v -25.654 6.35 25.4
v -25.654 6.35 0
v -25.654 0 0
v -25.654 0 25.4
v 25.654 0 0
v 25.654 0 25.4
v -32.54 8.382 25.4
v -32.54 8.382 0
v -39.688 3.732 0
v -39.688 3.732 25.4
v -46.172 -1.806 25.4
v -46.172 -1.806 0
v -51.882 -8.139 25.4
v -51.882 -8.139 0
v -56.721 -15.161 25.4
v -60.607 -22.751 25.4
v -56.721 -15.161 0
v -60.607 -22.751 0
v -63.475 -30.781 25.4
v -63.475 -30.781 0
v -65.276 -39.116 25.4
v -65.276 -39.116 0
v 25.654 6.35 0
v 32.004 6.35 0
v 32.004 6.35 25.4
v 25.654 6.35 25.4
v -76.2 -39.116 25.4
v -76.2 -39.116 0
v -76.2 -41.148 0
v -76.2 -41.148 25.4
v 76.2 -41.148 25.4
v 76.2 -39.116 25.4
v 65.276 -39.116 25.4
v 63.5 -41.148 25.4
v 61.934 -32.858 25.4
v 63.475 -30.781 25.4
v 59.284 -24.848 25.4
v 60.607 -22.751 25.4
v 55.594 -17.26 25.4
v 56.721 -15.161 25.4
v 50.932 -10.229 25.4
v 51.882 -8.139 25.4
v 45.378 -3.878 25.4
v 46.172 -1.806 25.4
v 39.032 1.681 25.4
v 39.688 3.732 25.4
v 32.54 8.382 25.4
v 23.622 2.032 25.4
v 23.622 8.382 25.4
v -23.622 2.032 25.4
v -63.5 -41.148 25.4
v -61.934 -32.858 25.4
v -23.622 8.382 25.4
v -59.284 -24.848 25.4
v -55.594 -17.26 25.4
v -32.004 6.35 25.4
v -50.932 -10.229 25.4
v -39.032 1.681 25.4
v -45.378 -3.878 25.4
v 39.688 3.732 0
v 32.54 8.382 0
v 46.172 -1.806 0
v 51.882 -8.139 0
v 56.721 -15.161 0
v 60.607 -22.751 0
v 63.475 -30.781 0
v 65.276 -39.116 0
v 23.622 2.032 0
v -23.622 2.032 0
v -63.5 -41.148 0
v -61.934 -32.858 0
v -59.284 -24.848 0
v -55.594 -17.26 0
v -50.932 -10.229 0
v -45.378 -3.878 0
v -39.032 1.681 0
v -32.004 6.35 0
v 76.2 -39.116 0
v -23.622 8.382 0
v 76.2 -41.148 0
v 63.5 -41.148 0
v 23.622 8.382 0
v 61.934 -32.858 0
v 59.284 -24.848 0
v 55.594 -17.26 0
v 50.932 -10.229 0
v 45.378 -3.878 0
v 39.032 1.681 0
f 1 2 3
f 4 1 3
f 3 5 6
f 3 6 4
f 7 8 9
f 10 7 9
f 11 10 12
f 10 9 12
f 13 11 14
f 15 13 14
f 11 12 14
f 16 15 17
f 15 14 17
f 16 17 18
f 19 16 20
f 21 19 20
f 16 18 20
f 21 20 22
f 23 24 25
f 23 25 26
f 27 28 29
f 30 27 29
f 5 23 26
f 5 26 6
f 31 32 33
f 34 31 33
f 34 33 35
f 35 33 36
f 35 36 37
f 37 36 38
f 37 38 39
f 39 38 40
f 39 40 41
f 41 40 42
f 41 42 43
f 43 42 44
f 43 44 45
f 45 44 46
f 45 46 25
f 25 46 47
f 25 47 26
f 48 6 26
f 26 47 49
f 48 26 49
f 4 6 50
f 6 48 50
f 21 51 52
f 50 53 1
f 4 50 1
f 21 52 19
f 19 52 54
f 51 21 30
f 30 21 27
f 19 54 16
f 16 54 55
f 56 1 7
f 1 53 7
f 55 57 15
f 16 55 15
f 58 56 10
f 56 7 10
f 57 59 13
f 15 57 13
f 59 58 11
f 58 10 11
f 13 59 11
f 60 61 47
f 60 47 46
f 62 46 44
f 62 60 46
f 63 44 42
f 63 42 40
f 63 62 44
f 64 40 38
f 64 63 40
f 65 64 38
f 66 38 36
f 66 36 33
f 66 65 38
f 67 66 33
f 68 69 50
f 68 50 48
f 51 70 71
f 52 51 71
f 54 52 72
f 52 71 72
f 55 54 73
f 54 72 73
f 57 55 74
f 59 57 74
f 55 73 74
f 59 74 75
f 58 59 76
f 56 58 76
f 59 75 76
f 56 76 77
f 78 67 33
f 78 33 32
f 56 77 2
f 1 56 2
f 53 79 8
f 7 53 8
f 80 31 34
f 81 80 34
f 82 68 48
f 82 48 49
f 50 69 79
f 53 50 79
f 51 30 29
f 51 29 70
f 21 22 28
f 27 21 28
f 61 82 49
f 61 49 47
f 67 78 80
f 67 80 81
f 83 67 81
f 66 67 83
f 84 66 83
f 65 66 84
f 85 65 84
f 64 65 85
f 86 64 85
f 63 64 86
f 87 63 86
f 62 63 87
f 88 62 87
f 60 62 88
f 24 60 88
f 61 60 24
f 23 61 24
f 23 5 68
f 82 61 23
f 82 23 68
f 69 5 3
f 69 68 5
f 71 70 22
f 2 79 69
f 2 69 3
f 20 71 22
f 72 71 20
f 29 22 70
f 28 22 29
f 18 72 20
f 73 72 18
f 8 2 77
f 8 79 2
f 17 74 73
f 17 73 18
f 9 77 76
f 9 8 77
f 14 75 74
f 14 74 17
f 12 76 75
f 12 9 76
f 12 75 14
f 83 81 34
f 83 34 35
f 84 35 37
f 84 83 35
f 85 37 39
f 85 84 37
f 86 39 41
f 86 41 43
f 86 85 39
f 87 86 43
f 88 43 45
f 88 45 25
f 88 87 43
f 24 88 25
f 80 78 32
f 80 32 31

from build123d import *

# Parameters (mm, degrees)
F1_DEPTH = 25.4


# Not quite as in the source:
# - a pattern or mirror of a feature is missing from the dataset's text; its kind, count and spacing are read off the source's solid


with BuildPart() as f1:
    # F0 (on Top) → F1 (new body)
    with BuildSketch(Plane.XY):
        with BuildLine():
            Line((-25.654, 0), (0, 0))
            Line((0, 0), (0, 2.032))
            Line((0, 2.032), (-23.622, 2.032))
            Line((-23.622, 2.032), (-23.622, 8.382))
            Line((-23.622, 8.382), (-32.5398903871, 8.382))
            ThreePointArc((-32.5398903871, 8.382), (-54.4156625214, -11.5711123989), (-65.2763838561, -39.116))
            Line((-65.2763838561, -39.116), (-76.2, -39.116))
            Line((-76.2, -39.116), (-76.2, -41.148))
            Line((-76.2, -41.148), (-63.5, -41.148))
            ThreePointArc((-63.5, -41.148), (-53.3799799525, -13.6670774646), (-32.004, 6.35))
            Line((-32.004, 6.35), (-25.654, 6.35))
            Line((-25.654, 6.35), (-25.654, 0))
        make_face()
    extrude(amount=F1_DEPTH)

    # F1_copies: F1 across plane


with BuildPart() as f1_1:
    add(f1.part)
    add(f1.part.mirror(Plane(origin=(0, 0, 0), x_dir=(0, 0, 1), z_dir=(1, 0, 0))))


solid = f1_1.part
